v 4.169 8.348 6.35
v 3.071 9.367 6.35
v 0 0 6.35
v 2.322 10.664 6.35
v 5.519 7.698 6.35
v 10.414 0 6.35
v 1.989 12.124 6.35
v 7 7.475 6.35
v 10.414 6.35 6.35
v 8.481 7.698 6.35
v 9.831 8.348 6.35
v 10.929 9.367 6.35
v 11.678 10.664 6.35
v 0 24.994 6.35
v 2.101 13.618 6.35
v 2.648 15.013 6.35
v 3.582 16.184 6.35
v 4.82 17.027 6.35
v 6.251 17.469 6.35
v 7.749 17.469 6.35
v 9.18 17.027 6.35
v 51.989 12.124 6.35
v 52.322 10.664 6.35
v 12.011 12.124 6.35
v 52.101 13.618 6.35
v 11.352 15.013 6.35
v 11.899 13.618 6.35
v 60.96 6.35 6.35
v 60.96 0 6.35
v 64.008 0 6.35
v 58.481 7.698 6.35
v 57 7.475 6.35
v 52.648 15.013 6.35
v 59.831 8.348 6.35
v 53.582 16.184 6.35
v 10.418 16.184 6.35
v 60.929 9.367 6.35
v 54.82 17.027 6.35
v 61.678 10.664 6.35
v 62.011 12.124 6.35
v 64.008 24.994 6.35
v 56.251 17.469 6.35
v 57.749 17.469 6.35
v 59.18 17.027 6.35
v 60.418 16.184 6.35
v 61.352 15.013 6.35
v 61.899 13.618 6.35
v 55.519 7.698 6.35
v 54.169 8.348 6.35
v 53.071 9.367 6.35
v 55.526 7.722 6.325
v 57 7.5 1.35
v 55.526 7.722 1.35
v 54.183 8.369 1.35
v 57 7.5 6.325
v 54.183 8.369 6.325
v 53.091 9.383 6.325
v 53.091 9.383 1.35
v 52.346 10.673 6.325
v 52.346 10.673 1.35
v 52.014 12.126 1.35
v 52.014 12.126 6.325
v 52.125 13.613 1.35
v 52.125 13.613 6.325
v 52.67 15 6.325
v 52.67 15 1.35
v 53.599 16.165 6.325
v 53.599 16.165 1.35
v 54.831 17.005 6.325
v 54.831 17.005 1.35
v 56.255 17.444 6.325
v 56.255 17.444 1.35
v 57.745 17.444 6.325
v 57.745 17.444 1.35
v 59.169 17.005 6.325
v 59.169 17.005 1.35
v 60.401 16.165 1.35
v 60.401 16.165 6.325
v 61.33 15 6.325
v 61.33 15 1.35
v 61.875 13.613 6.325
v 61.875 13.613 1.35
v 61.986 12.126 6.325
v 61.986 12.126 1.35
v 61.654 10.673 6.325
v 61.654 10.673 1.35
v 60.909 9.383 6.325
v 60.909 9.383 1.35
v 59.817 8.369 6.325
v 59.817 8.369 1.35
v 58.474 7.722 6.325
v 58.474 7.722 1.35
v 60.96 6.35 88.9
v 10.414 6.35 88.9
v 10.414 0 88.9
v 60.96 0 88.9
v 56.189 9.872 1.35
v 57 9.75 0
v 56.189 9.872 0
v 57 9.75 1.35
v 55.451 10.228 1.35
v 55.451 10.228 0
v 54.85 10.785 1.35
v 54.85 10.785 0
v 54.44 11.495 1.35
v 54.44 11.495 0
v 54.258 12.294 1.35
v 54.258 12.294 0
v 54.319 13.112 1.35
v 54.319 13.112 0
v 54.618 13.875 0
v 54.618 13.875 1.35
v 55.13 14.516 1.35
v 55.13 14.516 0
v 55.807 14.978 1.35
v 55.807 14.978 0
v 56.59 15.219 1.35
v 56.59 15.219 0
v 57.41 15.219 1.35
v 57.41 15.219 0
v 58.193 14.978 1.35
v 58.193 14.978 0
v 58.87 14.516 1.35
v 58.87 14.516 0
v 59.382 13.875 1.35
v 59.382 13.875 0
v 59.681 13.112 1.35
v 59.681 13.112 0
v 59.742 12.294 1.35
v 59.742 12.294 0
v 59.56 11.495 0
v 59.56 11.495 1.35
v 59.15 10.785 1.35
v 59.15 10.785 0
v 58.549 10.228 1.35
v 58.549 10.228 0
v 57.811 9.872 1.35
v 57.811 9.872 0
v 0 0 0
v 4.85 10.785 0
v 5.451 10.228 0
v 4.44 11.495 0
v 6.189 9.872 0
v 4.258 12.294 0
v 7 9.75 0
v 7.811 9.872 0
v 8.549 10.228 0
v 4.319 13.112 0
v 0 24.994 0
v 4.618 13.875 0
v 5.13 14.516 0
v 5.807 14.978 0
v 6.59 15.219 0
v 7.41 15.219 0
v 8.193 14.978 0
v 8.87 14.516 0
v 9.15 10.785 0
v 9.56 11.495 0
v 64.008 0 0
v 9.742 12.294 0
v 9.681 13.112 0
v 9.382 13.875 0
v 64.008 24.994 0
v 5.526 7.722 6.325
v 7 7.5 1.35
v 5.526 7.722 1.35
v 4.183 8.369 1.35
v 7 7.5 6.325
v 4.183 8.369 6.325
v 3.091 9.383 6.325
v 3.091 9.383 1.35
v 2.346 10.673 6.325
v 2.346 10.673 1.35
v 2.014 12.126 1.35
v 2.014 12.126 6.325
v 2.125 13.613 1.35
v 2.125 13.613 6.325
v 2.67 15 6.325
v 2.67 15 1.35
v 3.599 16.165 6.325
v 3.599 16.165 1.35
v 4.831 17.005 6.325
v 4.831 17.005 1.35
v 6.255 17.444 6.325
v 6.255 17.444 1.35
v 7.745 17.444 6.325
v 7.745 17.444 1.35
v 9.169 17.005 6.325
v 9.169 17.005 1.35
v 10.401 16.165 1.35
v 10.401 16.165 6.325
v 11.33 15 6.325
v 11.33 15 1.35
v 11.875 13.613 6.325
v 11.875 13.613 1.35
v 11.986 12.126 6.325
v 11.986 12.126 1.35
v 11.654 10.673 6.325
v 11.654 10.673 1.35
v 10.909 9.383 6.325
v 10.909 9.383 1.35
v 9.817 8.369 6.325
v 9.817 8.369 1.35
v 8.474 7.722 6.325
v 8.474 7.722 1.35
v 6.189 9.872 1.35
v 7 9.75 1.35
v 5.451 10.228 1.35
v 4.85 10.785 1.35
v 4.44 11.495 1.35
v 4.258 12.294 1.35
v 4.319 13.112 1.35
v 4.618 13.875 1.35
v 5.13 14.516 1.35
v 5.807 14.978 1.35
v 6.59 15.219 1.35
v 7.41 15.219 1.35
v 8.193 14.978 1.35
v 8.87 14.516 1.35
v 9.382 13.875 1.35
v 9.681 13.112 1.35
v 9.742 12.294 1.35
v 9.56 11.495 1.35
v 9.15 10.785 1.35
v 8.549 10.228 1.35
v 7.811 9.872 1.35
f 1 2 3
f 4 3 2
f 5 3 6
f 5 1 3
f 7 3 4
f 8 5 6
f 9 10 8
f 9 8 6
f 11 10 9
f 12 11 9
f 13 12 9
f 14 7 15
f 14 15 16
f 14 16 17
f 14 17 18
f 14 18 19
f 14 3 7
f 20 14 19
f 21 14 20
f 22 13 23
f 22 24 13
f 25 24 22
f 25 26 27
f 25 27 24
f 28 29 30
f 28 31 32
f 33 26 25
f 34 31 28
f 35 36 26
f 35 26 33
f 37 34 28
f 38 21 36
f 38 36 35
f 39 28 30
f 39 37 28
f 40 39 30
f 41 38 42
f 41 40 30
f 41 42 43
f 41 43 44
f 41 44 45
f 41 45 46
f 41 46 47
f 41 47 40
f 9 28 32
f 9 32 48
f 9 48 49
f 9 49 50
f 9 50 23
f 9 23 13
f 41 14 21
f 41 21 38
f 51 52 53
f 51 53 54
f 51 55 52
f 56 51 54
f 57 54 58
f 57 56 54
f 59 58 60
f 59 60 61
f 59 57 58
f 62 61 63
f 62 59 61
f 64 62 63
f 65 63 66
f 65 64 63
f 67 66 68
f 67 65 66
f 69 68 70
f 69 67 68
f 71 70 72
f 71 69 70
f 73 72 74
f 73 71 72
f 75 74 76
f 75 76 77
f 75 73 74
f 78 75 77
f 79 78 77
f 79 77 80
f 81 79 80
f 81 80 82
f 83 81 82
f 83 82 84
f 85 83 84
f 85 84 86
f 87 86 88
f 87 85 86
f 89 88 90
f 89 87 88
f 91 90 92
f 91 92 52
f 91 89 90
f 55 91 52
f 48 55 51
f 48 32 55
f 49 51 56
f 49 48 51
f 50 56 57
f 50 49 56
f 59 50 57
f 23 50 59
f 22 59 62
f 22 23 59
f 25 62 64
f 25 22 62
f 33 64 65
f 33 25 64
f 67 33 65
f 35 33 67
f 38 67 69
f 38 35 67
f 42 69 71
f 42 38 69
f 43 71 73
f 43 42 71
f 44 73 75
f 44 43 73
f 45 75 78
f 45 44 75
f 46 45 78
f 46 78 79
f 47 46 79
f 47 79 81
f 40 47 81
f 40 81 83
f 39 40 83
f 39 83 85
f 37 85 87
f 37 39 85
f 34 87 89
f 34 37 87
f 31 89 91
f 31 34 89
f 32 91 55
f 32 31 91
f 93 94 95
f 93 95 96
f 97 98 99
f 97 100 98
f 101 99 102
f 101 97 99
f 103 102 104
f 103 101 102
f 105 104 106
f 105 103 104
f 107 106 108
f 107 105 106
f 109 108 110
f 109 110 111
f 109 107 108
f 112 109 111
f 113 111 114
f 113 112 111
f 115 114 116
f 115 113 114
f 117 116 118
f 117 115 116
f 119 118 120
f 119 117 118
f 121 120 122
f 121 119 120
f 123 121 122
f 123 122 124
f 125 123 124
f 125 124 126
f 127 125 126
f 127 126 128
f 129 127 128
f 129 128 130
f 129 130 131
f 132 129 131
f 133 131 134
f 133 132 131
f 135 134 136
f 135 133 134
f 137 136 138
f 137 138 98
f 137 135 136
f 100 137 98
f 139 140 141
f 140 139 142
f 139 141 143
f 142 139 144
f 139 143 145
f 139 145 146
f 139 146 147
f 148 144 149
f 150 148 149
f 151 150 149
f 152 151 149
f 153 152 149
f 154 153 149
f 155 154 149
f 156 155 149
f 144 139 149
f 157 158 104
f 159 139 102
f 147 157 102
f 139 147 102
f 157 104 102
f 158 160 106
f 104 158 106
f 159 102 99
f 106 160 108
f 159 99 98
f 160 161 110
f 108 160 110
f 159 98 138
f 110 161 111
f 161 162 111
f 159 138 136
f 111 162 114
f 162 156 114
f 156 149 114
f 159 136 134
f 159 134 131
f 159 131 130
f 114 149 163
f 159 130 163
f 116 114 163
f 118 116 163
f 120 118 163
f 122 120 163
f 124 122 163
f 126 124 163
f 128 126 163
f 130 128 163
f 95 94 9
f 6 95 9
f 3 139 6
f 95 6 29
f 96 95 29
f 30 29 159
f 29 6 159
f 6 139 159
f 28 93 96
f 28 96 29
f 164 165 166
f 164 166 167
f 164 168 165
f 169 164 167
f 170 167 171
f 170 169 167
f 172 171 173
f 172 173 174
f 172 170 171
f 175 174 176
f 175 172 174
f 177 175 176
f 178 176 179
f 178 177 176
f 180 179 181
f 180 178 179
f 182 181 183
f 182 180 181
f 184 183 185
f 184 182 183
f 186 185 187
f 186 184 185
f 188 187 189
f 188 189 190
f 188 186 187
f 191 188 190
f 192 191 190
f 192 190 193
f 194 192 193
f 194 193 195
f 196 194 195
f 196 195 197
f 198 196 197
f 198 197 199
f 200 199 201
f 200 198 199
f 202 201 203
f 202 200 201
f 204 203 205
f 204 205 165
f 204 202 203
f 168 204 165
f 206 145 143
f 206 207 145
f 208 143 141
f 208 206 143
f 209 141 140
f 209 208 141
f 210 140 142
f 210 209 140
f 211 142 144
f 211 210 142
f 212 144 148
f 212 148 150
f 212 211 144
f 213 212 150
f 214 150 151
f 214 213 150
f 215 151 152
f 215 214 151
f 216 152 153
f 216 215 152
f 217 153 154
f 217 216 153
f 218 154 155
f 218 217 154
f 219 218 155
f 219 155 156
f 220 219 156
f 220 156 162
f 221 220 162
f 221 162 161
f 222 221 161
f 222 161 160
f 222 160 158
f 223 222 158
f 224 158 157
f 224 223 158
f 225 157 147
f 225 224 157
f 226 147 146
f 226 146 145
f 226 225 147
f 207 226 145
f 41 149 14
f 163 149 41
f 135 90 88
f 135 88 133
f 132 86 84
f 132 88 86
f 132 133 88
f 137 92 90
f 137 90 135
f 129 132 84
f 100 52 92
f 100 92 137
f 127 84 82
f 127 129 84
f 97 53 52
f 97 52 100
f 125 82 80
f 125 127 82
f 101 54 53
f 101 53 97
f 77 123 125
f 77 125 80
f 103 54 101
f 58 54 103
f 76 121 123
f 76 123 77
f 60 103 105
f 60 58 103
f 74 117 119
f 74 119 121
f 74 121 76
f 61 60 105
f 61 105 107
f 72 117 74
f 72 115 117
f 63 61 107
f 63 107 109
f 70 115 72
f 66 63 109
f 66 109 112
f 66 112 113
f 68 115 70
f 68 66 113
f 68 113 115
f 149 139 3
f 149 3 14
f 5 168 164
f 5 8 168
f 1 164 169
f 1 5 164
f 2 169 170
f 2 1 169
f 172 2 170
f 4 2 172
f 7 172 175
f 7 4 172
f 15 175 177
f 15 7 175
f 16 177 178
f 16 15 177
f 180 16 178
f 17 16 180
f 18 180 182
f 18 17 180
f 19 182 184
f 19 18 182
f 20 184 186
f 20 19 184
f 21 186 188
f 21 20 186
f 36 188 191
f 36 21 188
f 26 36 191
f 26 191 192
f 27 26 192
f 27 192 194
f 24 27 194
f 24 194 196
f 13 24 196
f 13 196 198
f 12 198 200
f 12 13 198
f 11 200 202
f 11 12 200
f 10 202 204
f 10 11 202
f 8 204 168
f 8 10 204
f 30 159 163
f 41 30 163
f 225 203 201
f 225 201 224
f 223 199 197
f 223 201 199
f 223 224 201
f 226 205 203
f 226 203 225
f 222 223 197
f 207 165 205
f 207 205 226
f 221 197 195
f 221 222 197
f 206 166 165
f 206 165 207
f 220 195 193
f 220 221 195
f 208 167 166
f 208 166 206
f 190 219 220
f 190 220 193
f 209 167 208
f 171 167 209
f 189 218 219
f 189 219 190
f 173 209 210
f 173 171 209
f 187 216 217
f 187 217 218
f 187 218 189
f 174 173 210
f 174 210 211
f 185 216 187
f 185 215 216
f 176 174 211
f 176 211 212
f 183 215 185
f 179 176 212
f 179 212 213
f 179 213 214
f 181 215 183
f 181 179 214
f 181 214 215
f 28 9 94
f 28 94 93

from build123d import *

# Parameters (mm, degrees)
SKETCH1_W                     = 64.008
SKETCH1_H                     = 24.9936
BOSS_EXTRUDE1_DEPTH           = 6.35
SKETCH2_W                     = 64.008
SKETCH2_H                     = 6.35
BOSS_EXTRUDE2_DEPTH           = 82.55
CBORE_FOR_M5_SHCS1_AT_2_COUNT = 2
CBORE_FOR_M5_SHCS1_AT_2_PITCH = 50
SKETCH8_W                     = 10.414
SKETCH8_H                     = 82.55
CUT_EXTRUDE1_DEPTH            = 112.120735621
SKETCH9_W                     = 3.048
SKETCH9_H                     = 82.55
CUT_EXTRUDE3_DEPTH            = 112.120735621


with BuildPart() as part:
    # Sketch1 → Boss-Extrude1 (new body)
    with BuildSketch(Plane.XY):
        with Locations((32.004, 12.4968)):
            Rectangle(SKETCH1_W, SKETCH1_H)
    extrude(amount=BOSS_EXTRUDE1_DEPTH)

    # Sketch2 → Boss-Extrude2 (add)
    with BuildSketch(Plane.XY.offset(6.35)):
        with Locations((32.004, 3.175)):
            Rectangle(SKETCH2_W, SKETCH2_H)
    extrude(amount=BOSS_EXTRUDE2_DEPTH)

    # Sketch7 → CBORE for M5 SHCS1 (revolve, cut)
    with BuildSketch(Plane(origin=(7, 12.5, 6.35), x_dir=(0, -1, 0), z_dir=(1, 0, 0))):
        Polygon((0, 0), (0, 6.35), (2.75, 6.35), (2.75, 5), (5, 5), (5, 0.025), (5.025, 0), align=None)
    cbore_for_m5_shcs1 = revolve(axis=Axis((7, 12.5, 12.7), (0, 0, -1)), mode=Mode.SUBTRACT)

    # CBORE for M5 SHCS1 at 2: CBORE for M5 SHCS1 ×2
    with Locations(*[(i * CBORE_FOR_M5_SHCS1_AT_2_PITCH, 0, 0) for i in range(1, CBORE_FOR_M5_SHCS1_AT_2_COUNT)]):
        add(cbore_for_m5_shcs1, mode=Mode.SUBTRACT)

    # Sketch8 → Cut-Extrude1 (cut, through all)
    with BuildSketch(Plane(origin=(0, 6.35, 0), x_dir=(1, 0, 0), z_dir=(0, 1, 0))):
        with Locations((5.207, -47.625)):
            Rectangle(SKETCH8_W, SKETCH8_H)
    extrude(amount=-CUT_EXTRUDE1_DEPTH, mode=Mode.SUBTRACT)

    # Sketch9 → Cut-Extrude3 (cut, through all)
    with BuildSketch(Plane(origin=(0, 6.35, 0), x_dir=(1, 0, 0), z_dir=(0, 1, 0))):
        with Locations((62.484, -47.625)):
            Rectangle(SKETCH9_W, SKETCH9_H)
    extrude(amount=-CUT_EXTRUDE3_DEPTH, mode=Mode.SUBTRACT)


solid = part.part
